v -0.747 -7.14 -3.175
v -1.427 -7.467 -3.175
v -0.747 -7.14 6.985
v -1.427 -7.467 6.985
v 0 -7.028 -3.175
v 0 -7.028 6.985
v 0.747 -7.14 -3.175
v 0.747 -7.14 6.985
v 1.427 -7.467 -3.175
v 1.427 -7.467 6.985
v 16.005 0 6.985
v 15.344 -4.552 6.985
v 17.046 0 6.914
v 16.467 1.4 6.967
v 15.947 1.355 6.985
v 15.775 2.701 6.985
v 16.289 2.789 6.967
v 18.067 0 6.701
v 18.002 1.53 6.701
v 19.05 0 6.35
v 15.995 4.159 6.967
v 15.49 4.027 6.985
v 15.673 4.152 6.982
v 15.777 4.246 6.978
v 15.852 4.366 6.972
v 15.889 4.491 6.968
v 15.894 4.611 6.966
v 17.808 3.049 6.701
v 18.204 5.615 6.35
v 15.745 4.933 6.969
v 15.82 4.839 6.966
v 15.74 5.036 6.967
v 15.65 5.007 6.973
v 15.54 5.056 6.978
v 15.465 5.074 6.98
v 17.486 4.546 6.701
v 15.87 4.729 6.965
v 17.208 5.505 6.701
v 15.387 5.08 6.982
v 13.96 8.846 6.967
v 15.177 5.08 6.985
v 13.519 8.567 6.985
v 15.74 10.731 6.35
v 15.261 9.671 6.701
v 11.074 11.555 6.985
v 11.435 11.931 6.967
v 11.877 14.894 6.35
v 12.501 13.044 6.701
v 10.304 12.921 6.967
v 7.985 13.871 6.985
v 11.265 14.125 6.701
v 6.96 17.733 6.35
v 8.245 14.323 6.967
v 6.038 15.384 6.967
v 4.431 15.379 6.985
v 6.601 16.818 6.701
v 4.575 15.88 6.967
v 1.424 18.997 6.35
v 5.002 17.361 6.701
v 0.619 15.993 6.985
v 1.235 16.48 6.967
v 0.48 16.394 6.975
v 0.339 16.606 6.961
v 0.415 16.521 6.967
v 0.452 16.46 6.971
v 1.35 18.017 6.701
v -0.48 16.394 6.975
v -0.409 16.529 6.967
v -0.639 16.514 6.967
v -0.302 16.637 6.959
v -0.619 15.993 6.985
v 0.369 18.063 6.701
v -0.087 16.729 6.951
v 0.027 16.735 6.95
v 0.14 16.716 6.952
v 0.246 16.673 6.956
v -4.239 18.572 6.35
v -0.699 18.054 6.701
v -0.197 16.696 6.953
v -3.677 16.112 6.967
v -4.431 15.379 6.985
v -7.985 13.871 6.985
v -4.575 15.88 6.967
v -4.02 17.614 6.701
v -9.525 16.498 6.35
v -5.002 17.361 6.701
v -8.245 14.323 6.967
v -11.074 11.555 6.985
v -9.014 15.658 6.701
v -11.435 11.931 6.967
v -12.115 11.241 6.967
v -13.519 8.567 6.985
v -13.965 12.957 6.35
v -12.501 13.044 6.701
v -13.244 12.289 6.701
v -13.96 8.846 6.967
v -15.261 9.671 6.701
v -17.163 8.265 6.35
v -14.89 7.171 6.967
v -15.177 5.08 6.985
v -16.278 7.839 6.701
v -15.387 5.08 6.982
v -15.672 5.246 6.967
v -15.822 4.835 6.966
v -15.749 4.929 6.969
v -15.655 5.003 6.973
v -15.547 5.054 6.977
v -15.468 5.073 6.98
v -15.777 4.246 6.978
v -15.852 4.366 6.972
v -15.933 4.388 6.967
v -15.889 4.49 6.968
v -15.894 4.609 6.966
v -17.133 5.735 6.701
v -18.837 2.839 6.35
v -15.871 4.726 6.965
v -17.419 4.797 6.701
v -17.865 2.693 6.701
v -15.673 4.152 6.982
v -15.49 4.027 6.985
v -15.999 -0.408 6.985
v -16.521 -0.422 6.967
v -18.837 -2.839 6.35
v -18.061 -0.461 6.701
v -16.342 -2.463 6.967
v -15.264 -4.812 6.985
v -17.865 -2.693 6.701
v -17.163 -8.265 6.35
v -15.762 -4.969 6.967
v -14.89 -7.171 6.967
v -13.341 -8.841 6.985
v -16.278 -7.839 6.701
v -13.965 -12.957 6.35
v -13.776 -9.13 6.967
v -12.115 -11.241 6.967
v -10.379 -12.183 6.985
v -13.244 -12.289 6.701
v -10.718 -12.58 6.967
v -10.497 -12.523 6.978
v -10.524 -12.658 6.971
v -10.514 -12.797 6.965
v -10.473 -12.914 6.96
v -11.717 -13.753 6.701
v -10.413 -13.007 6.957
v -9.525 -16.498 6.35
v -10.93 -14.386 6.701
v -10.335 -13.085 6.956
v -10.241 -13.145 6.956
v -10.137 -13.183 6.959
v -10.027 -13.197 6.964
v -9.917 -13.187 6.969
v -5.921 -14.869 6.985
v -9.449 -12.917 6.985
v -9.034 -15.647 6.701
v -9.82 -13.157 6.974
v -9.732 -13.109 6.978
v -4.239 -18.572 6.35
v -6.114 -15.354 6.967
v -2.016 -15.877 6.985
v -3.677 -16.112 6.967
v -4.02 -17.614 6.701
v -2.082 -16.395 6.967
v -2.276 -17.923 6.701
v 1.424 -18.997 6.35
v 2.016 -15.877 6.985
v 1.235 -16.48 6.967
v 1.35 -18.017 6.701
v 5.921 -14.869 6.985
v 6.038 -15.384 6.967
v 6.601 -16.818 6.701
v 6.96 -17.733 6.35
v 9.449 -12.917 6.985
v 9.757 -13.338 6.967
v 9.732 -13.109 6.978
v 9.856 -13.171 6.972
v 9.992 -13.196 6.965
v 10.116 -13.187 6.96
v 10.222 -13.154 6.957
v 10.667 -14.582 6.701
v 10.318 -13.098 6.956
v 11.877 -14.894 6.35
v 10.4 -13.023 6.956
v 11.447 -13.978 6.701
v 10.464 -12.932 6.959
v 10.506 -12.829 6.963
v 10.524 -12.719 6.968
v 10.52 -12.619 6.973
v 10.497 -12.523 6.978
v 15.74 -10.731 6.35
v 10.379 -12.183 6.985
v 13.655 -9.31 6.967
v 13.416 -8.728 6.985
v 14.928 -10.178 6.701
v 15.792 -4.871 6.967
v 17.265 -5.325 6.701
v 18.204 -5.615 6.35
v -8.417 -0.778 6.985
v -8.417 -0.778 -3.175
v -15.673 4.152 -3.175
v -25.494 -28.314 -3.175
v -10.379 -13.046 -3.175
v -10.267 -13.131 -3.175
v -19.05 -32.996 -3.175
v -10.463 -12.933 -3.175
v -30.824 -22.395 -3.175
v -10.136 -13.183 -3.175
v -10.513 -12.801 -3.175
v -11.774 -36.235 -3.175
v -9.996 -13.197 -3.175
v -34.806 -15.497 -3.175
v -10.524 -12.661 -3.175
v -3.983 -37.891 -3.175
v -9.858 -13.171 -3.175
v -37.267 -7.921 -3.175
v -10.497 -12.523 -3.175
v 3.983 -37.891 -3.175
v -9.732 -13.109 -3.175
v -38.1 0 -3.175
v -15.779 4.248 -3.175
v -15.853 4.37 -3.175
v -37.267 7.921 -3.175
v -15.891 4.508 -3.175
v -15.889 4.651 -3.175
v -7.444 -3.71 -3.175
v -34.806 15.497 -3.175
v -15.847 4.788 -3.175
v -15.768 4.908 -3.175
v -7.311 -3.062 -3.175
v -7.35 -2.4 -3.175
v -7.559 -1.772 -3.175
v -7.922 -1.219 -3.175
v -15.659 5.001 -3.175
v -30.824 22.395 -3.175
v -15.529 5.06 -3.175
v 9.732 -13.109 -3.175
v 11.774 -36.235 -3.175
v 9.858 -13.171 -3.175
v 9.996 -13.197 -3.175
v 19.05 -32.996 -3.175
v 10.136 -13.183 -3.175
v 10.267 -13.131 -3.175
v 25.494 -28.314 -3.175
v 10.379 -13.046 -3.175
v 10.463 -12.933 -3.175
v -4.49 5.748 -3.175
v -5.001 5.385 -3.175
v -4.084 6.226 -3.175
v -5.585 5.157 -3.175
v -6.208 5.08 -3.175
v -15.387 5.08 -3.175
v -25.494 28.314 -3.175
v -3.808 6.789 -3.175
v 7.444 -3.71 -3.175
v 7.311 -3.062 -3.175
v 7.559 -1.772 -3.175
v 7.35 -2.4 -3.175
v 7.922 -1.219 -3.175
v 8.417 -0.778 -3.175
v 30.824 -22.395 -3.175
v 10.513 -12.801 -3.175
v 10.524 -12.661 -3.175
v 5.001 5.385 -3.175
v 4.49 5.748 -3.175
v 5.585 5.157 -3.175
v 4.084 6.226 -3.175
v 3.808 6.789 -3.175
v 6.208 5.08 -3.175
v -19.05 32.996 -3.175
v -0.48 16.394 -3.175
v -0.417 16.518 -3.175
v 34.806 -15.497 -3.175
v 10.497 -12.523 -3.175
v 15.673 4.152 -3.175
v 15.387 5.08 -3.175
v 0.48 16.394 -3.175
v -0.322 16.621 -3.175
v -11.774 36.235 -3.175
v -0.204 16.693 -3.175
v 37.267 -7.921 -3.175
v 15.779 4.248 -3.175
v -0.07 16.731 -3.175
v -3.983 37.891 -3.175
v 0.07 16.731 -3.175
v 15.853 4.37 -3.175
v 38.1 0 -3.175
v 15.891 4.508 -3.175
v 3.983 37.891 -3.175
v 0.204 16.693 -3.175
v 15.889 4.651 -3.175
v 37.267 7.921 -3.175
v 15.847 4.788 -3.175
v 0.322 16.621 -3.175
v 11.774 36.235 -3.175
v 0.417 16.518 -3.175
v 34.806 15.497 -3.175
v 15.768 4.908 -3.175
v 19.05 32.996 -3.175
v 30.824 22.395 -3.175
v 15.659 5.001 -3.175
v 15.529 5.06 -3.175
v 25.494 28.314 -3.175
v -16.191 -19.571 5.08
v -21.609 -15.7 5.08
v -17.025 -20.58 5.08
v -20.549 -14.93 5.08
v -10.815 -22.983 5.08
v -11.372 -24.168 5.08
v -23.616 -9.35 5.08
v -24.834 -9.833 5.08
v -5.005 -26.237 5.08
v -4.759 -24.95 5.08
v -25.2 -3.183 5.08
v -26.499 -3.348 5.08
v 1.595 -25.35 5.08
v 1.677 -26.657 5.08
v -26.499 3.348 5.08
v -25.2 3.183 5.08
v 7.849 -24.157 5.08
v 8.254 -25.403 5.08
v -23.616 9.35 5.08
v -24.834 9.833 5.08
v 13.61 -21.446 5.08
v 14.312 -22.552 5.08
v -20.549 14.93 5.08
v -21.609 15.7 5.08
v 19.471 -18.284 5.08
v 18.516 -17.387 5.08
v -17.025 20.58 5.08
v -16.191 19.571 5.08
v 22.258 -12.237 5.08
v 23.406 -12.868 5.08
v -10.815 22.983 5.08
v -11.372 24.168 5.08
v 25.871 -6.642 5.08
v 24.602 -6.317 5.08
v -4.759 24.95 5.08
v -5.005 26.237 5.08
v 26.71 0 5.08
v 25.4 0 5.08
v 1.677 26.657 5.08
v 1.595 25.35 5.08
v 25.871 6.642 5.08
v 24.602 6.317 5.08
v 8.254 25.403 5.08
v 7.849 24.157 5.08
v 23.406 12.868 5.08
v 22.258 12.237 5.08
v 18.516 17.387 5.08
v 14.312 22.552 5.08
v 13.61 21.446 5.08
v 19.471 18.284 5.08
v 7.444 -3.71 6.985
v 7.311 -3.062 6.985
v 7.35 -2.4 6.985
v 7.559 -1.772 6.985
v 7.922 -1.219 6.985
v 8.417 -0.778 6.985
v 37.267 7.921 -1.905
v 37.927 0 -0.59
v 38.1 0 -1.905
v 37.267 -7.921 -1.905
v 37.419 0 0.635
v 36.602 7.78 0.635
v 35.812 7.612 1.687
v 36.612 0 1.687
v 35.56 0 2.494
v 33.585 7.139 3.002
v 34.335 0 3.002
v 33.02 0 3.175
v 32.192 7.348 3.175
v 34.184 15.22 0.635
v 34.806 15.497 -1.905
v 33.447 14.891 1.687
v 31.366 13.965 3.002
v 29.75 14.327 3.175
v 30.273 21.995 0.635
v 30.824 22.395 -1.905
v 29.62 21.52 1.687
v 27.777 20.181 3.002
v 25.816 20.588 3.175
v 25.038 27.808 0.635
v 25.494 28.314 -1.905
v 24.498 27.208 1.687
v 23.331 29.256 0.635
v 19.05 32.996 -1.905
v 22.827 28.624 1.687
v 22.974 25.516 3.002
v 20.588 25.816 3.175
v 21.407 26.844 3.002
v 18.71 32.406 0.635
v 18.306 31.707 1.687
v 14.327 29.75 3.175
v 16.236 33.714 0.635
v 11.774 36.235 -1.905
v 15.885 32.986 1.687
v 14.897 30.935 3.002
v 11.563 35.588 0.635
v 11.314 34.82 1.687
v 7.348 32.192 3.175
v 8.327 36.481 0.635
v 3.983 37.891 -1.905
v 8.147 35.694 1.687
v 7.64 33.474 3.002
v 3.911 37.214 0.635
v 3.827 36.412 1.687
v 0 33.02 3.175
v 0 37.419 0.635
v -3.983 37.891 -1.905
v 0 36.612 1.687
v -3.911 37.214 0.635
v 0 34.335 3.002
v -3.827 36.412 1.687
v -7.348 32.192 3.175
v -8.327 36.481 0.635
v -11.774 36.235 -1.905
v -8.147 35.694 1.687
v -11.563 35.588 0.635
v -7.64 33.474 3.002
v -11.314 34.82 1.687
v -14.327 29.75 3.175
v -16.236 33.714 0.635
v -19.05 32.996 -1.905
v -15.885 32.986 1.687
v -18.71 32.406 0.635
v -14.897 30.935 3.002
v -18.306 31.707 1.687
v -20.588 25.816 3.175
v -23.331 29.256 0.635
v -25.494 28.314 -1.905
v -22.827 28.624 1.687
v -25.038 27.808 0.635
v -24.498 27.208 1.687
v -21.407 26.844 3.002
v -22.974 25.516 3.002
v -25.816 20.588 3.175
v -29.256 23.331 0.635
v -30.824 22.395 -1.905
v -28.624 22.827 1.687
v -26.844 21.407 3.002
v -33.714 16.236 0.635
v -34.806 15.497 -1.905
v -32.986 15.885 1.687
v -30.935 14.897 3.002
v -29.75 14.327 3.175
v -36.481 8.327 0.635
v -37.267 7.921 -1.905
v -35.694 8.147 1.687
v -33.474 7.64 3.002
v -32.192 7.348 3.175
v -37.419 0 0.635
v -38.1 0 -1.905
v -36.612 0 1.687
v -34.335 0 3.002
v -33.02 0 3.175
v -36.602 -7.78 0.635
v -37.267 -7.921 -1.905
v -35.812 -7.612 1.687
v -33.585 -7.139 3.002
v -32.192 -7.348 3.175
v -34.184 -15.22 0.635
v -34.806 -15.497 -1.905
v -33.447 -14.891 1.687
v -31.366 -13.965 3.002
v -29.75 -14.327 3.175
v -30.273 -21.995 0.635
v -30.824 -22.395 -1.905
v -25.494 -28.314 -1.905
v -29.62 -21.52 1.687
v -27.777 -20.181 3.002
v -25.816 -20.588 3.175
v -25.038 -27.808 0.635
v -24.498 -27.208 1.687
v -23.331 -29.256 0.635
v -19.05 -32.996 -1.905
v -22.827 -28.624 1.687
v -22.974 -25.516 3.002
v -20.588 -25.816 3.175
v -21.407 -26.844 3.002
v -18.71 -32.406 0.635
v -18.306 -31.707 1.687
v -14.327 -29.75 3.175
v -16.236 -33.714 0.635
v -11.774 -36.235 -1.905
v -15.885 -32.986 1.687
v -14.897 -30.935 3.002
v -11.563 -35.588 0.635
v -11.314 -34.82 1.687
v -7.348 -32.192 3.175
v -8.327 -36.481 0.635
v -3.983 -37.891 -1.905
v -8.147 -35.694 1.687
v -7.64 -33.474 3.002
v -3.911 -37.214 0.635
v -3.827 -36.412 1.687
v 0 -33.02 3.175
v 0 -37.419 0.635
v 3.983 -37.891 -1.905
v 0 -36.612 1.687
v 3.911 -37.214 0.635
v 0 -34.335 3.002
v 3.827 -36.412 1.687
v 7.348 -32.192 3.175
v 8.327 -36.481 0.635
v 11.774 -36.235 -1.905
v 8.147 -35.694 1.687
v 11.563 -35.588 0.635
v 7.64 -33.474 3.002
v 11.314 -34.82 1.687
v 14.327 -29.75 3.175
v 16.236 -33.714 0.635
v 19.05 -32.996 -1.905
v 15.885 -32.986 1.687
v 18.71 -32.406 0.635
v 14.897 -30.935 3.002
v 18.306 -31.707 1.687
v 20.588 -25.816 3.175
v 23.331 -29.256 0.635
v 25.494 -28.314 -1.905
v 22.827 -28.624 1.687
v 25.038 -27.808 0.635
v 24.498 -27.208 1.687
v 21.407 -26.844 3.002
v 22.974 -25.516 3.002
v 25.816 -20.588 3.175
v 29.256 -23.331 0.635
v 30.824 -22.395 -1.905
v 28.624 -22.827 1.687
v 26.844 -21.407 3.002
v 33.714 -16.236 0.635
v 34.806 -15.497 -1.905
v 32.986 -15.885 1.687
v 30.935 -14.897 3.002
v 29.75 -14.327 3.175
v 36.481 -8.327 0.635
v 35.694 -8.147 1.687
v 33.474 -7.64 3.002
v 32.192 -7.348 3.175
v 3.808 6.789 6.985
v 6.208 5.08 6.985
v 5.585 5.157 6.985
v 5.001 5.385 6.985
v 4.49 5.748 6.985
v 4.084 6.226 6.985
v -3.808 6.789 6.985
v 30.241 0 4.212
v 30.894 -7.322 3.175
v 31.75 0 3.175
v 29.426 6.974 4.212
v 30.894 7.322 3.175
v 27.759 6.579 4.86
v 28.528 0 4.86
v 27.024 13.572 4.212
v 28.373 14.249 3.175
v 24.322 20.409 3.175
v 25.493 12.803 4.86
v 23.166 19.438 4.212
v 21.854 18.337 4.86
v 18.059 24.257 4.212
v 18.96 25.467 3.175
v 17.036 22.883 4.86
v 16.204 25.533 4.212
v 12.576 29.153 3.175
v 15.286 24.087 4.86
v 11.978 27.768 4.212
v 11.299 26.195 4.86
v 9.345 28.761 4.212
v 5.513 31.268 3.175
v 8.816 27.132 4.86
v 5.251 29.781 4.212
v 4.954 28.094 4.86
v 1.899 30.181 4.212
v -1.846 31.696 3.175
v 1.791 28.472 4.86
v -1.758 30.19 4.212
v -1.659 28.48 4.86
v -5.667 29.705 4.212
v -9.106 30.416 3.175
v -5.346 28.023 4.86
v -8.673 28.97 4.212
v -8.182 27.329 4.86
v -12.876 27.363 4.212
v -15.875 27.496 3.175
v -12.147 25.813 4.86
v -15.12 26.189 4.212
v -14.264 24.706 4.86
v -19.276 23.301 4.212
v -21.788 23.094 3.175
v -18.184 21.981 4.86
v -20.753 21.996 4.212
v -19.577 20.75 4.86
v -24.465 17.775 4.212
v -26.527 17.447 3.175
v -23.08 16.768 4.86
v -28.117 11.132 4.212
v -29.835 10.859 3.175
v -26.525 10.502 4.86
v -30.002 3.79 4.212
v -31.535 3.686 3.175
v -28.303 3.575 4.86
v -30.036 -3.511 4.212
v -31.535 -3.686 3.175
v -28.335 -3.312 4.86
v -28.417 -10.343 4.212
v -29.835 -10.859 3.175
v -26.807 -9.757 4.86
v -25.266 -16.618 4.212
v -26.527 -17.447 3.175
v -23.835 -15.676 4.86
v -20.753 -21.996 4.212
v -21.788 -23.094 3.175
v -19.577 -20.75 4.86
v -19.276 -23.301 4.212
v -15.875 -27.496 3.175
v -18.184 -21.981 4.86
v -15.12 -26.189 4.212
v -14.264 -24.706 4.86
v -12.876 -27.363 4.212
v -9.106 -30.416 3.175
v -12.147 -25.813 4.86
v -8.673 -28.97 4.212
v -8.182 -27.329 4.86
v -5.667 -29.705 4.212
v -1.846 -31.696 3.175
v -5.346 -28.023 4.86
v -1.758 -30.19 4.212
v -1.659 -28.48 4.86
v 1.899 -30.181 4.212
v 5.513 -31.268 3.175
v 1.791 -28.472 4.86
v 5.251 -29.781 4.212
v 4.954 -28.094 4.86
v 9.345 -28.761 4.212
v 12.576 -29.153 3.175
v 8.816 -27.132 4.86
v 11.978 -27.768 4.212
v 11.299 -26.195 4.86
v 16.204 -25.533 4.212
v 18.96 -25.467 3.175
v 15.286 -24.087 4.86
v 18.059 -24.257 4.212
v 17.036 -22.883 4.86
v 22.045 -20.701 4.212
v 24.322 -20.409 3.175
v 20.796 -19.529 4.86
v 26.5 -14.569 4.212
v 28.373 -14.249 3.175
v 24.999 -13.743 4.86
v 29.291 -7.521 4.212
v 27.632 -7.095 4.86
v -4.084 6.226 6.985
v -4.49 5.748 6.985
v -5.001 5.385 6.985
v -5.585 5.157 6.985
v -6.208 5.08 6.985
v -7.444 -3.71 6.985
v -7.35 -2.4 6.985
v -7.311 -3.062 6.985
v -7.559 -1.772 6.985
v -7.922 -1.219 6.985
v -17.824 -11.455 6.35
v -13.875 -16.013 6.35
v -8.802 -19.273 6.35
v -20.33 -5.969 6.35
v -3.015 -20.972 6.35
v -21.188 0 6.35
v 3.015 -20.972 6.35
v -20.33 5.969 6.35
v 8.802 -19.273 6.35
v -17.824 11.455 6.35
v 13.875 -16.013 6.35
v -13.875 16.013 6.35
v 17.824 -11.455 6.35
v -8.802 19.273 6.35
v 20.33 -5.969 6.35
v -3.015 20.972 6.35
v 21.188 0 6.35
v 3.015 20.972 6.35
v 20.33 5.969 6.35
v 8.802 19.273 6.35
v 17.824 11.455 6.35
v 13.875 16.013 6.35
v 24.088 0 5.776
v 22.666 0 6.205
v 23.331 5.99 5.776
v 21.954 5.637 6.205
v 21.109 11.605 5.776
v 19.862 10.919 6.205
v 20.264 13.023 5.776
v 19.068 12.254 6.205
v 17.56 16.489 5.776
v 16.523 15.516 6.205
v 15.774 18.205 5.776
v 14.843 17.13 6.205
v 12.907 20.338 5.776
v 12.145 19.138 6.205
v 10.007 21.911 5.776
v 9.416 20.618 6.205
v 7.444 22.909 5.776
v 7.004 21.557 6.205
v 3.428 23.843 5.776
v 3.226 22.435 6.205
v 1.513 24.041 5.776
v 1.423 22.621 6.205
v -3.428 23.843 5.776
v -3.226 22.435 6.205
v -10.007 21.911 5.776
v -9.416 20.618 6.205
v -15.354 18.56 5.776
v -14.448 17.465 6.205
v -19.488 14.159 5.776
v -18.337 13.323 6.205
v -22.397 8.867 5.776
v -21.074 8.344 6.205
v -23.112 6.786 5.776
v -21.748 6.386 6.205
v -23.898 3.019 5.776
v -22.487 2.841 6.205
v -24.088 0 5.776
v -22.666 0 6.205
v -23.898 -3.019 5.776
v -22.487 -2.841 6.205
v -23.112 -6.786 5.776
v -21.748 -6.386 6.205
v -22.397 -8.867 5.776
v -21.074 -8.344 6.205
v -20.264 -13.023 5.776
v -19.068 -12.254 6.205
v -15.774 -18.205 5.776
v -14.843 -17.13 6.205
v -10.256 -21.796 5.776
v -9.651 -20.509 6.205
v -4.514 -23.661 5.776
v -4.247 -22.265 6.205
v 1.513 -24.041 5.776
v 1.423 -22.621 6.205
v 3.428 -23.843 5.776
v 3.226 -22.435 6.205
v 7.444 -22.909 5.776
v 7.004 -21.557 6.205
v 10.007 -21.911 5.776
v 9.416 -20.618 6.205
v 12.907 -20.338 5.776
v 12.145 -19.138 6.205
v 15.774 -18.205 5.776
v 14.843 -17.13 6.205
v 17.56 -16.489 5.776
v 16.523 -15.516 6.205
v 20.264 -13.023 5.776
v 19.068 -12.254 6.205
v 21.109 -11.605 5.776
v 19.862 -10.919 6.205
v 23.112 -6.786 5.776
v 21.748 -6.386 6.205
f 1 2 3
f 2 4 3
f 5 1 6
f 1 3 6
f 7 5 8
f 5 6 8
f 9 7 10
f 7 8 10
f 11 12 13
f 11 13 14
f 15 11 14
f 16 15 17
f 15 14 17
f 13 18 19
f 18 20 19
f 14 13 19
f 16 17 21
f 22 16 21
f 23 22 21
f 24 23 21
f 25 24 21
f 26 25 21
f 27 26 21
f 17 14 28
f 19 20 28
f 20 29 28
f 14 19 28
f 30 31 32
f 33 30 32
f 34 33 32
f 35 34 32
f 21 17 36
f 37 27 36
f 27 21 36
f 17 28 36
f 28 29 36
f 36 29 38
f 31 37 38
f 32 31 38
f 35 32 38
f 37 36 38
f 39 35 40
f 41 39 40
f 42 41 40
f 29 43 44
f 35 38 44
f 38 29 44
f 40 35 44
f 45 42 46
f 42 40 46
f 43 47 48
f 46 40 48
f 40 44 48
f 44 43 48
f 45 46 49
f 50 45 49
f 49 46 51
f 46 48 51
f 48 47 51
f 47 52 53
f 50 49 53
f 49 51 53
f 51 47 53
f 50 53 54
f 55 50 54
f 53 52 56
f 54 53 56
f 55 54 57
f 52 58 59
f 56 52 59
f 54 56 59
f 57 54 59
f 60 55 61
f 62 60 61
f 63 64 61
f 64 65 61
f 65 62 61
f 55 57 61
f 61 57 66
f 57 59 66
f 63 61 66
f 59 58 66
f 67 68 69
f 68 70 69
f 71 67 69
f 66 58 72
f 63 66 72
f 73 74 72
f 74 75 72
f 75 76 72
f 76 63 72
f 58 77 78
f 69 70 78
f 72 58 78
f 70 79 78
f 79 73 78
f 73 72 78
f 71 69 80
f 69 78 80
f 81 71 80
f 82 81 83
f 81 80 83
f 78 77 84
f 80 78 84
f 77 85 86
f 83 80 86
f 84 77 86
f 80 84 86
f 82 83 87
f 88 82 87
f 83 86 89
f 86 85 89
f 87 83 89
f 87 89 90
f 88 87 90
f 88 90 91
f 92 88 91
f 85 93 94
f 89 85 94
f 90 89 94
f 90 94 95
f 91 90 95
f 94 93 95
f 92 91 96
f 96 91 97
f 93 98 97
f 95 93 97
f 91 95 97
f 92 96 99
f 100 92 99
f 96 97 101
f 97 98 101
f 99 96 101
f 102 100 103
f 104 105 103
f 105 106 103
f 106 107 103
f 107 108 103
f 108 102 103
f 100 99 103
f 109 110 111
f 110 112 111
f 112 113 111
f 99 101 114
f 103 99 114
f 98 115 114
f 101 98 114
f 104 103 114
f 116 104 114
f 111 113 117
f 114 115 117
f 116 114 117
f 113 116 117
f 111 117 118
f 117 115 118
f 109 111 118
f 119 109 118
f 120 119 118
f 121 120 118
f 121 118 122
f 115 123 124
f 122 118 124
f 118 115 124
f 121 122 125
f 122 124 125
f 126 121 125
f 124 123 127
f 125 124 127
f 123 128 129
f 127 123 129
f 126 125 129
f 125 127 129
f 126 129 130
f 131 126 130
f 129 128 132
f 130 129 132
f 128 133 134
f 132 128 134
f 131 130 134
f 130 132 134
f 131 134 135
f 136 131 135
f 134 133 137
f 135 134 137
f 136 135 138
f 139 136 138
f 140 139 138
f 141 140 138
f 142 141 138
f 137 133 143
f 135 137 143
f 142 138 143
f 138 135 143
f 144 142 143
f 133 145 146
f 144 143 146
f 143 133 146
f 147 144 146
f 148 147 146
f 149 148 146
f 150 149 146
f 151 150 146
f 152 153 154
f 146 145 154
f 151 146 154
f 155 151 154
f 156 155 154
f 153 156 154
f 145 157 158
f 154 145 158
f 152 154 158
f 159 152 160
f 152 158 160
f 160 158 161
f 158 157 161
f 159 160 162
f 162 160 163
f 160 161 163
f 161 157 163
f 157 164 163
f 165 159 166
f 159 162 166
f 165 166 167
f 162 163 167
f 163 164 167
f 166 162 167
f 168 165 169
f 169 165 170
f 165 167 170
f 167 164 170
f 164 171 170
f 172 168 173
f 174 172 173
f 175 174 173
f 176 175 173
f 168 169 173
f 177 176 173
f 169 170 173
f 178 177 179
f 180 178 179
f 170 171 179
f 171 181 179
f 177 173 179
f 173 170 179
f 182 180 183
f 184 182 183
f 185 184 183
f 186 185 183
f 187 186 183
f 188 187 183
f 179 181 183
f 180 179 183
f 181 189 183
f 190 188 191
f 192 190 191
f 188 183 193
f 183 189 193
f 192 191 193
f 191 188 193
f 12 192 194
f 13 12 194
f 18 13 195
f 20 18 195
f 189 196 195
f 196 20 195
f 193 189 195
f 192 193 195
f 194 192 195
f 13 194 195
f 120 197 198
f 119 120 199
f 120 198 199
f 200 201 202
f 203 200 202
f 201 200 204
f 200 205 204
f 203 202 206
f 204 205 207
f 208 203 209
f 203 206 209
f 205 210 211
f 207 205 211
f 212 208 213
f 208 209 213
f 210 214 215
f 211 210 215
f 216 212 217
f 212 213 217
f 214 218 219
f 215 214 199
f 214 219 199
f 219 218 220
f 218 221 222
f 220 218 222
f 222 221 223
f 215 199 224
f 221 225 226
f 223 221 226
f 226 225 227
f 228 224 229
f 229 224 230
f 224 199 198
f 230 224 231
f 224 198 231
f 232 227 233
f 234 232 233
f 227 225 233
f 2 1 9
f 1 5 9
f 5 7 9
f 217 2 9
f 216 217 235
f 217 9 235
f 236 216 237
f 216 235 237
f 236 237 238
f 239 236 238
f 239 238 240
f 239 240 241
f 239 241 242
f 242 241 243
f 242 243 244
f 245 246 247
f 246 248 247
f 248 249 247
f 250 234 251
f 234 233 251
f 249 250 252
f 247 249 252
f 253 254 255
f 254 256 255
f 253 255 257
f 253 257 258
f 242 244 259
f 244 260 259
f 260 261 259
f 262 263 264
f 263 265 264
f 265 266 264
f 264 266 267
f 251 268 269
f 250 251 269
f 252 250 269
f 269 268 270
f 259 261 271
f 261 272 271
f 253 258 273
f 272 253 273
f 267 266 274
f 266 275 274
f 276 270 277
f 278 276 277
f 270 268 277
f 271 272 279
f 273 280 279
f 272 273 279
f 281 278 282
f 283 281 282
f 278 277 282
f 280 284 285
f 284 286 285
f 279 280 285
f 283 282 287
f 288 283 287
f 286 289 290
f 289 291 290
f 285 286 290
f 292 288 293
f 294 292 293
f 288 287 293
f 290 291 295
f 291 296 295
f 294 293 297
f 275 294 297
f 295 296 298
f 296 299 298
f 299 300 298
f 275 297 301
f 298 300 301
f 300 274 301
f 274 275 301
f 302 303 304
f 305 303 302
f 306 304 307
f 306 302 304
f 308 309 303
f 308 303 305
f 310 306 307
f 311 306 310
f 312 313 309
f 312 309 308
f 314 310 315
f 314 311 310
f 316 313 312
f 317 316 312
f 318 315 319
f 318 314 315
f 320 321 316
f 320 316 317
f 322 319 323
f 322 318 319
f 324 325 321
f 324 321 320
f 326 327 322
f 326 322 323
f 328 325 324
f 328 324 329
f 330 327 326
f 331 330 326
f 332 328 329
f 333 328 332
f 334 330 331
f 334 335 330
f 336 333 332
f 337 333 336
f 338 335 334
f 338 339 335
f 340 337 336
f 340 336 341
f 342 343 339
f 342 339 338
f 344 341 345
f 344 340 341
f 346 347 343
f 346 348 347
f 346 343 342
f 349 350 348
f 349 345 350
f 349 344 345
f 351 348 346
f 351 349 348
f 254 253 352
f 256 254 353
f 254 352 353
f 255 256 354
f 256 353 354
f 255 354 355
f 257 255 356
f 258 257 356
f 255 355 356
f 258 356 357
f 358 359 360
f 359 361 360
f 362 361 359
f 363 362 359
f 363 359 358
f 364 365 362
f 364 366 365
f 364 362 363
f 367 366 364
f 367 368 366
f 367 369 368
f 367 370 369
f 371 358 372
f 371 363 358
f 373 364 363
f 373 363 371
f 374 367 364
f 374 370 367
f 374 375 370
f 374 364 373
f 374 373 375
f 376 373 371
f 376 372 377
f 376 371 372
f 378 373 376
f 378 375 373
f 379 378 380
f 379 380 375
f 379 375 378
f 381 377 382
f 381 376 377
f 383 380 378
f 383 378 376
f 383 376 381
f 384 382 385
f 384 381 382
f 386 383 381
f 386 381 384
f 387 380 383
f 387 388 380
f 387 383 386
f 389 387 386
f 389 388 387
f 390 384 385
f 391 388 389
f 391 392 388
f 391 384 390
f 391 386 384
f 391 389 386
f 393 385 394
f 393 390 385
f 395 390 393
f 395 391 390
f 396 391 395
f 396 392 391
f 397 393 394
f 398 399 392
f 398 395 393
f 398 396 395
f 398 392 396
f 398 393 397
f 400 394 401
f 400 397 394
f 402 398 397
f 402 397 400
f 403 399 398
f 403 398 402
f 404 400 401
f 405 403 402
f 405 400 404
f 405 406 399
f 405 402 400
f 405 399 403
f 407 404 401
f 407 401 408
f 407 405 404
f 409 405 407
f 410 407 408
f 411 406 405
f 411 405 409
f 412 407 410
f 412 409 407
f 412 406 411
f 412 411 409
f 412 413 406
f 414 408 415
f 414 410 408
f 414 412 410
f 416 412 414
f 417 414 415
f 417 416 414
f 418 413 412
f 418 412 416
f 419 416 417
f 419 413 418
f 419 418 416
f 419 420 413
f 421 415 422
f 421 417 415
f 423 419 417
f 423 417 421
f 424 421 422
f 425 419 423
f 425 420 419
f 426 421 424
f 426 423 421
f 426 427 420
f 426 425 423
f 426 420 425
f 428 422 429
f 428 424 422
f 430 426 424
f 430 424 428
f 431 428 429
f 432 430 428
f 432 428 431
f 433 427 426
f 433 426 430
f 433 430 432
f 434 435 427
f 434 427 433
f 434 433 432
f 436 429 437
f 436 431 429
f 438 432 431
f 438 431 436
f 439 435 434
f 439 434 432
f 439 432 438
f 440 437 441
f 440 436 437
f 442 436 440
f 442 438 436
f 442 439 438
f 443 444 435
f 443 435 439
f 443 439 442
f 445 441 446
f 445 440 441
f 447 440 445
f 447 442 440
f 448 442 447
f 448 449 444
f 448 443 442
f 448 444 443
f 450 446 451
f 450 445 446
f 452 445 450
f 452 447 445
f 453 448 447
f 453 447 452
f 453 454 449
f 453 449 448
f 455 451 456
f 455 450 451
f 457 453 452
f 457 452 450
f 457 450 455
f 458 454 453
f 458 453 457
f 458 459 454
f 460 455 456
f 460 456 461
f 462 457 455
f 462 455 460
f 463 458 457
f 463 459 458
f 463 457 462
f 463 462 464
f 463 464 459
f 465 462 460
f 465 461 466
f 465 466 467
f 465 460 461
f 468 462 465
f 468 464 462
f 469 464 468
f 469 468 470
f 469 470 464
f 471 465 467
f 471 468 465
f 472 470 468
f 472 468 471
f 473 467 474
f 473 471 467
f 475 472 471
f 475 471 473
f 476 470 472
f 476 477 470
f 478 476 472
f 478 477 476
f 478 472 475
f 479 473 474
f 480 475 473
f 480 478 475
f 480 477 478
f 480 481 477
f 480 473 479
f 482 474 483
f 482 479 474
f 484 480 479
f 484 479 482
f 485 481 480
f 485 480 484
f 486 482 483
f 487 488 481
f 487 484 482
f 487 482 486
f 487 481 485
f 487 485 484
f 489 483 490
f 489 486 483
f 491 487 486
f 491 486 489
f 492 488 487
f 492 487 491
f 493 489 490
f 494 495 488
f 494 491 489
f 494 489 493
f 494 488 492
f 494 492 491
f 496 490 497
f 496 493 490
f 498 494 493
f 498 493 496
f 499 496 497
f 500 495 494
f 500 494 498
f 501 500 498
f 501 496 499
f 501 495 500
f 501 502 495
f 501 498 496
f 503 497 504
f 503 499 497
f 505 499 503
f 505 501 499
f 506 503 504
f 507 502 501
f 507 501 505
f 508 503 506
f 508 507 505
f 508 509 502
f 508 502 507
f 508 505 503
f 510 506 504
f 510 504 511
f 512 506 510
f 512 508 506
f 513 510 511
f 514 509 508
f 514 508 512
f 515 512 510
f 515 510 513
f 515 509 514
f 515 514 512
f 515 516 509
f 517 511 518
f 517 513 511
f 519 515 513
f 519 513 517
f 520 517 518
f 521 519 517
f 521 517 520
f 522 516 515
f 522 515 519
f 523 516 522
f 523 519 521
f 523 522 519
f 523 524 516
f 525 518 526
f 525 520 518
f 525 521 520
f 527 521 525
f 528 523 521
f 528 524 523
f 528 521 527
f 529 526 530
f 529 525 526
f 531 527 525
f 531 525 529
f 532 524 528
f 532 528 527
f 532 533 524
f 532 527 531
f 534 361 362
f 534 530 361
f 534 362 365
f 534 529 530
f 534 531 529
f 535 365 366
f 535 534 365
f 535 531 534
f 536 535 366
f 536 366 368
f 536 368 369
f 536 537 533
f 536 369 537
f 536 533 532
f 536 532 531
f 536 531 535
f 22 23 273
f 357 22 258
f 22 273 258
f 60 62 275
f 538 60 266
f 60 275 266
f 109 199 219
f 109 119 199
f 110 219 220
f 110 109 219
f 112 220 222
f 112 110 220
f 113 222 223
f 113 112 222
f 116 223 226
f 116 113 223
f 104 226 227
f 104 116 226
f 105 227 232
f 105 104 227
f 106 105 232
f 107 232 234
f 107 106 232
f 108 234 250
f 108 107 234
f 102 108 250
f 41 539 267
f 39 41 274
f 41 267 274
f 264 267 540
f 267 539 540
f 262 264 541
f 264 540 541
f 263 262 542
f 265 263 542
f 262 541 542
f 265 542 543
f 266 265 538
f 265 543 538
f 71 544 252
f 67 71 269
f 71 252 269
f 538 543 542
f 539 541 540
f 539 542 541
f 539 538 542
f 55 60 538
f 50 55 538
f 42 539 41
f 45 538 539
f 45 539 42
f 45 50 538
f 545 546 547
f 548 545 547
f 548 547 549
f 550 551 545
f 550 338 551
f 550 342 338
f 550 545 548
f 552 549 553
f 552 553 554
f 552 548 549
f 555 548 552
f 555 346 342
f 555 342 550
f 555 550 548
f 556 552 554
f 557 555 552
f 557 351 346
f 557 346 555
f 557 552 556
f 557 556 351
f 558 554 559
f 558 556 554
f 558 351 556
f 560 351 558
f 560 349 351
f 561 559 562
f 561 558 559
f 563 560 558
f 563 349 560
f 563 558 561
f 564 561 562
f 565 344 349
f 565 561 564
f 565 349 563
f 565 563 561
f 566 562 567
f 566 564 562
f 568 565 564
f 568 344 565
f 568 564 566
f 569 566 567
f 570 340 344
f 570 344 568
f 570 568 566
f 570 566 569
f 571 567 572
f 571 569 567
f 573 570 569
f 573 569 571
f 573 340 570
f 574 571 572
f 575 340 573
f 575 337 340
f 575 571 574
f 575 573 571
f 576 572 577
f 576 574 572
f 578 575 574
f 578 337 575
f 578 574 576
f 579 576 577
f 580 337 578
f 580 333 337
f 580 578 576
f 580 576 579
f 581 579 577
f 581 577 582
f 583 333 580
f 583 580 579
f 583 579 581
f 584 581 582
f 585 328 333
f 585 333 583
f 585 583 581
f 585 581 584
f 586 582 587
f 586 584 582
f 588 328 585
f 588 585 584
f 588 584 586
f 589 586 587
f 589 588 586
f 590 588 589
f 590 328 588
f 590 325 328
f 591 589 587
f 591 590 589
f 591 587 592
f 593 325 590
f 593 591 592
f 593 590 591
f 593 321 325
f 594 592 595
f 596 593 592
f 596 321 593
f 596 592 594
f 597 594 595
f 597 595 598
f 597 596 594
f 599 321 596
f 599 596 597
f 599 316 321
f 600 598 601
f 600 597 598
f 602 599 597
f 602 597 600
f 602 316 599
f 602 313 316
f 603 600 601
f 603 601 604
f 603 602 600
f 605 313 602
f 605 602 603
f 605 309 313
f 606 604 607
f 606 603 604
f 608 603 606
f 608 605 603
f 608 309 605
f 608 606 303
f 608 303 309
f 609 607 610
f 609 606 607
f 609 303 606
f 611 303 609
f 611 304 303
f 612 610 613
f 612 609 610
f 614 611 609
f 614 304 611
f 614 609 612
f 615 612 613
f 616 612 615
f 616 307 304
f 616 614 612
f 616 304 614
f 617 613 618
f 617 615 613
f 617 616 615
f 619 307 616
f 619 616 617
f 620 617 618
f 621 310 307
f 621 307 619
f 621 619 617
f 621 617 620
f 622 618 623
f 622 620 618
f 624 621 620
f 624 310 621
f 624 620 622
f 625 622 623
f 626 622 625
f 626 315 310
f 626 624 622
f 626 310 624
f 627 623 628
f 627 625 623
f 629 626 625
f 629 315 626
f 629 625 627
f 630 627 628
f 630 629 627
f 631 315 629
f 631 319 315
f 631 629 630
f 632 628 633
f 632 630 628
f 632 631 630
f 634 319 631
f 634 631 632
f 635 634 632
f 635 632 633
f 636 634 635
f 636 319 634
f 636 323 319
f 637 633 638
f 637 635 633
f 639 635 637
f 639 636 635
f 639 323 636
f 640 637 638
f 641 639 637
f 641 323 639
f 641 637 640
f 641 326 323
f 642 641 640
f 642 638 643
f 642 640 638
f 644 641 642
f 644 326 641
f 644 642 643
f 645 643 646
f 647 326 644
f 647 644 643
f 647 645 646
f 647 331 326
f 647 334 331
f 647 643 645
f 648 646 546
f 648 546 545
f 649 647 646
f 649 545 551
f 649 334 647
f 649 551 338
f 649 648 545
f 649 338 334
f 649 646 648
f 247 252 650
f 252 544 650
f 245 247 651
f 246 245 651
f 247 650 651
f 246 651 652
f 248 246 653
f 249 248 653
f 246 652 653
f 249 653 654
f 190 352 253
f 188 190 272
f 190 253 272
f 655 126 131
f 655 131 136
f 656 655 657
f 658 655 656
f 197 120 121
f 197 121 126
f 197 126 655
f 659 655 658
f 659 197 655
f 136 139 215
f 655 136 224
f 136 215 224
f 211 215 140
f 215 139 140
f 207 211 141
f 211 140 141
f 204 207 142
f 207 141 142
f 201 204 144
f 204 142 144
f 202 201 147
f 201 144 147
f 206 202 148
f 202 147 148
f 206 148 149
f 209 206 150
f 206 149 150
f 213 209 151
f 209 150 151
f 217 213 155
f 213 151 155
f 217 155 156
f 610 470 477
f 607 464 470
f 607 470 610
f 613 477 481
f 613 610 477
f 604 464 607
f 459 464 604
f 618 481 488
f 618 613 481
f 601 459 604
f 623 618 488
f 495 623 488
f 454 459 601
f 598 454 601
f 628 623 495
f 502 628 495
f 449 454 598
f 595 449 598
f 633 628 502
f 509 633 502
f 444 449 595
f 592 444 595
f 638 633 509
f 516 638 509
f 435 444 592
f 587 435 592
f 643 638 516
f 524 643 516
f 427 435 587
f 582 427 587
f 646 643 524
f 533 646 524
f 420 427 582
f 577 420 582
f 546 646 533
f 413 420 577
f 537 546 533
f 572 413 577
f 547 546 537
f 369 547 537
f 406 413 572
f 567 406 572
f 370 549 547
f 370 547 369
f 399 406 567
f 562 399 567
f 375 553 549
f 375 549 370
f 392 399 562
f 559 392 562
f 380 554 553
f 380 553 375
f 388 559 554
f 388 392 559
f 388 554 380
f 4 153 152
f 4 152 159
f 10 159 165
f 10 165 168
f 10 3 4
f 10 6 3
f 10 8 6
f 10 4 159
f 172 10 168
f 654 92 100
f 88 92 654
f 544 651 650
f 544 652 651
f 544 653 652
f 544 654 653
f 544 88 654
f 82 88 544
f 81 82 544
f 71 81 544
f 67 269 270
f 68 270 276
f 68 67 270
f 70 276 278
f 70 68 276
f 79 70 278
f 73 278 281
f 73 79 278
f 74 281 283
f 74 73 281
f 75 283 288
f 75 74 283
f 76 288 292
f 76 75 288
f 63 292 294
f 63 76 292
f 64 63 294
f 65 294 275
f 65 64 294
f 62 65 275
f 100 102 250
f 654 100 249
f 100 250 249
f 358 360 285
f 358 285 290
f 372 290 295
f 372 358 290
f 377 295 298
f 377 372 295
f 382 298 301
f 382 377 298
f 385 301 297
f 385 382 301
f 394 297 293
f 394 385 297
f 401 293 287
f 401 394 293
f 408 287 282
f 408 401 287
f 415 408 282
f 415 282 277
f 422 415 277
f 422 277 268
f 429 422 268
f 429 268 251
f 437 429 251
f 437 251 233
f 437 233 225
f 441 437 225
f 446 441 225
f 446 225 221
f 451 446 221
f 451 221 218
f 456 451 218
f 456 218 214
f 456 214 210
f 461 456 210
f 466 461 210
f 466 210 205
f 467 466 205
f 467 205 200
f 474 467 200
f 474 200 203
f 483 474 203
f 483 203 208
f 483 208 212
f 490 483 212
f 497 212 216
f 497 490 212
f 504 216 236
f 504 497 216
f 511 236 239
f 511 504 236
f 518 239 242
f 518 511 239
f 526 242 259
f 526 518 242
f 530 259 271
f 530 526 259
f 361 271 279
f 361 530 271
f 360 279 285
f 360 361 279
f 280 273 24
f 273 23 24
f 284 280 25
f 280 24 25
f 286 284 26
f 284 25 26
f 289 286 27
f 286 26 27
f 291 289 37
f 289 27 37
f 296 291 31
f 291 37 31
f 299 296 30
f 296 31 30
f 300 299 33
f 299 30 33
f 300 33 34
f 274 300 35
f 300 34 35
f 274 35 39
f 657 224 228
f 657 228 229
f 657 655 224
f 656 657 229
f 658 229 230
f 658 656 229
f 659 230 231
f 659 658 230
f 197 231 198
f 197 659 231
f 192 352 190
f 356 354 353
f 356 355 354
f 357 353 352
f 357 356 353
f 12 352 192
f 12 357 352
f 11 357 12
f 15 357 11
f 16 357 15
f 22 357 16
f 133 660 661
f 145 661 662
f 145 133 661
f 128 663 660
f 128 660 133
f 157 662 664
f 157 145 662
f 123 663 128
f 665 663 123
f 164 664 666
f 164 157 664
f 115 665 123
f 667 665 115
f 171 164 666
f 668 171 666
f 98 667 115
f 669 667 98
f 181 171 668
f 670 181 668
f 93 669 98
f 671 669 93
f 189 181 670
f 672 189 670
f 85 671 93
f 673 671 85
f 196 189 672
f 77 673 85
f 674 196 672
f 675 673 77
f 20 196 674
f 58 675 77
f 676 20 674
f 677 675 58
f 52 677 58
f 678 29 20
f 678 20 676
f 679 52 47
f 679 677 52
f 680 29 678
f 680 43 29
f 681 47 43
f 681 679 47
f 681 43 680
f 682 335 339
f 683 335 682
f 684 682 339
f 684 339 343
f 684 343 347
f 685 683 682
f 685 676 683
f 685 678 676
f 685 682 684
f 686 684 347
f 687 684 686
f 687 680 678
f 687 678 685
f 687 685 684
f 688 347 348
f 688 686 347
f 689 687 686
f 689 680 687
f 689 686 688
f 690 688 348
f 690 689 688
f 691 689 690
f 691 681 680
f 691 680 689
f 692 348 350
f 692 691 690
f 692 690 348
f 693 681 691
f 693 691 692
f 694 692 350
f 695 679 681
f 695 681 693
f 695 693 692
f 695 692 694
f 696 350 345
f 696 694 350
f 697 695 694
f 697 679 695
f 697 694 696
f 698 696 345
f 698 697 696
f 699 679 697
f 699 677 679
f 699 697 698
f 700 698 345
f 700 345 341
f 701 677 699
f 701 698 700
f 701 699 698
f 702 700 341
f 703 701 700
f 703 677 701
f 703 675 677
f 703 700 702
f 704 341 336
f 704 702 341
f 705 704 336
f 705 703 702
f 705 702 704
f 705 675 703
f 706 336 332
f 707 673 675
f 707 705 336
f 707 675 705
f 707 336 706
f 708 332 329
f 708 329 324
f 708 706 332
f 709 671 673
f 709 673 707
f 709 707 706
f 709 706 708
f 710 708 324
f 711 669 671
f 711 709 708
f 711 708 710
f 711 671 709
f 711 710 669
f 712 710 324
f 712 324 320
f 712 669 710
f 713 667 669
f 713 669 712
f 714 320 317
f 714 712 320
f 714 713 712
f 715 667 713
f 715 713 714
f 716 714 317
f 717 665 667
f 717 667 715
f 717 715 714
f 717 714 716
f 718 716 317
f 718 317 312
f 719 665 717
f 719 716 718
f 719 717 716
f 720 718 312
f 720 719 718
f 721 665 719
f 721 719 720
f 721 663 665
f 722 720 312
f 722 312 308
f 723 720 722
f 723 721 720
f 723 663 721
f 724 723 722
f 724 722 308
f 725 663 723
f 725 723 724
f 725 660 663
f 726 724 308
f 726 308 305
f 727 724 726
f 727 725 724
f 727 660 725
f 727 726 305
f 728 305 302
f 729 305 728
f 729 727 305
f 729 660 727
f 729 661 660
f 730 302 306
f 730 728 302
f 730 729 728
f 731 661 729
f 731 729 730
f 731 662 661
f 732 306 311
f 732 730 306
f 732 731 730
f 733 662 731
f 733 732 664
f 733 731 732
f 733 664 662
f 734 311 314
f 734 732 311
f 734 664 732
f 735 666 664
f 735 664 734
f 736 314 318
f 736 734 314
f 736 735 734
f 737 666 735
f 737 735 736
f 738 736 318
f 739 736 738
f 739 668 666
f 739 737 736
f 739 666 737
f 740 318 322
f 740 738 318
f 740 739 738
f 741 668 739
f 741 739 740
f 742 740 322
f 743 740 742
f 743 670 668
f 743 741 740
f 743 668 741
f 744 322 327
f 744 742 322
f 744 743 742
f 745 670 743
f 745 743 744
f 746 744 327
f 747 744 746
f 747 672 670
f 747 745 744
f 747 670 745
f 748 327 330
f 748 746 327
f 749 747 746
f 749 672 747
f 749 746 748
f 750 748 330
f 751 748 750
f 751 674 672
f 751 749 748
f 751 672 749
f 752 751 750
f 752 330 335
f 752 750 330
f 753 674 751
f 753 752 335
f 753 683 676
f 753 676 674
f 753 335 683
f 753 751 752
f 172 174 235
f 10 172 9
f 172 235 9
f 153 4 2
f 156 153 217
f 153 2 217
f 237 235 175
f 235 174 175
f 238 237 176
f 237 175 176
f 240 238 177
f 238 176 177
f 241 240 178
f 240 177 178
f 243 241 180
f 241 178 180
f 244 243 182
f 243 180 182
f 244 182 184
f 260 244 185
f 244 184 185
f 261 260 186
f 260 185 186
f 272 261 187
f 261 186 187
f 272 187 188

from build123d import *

# Parameters (mm, degrees)
F0_R      = 38.1
F1_DEPTH  = 3.175
F3_R      = 31.75
F4_DEPTH  = 1.905
F5_R      = 25.4
F6_DEPTH  = 1.27
F7_R      = 19.05
F8_DEPTH  = 0.635
F10_DEPTH = 10.161
F11_R     = 5.08
F15_R     = 2.54
F16_R     = 0.508


# Not quite as in the source:
# - a fillet or chamfer that OpenCascade refuses, or shapes differently, is made with other operations: its cross-section is extruded or revolved along the edge and cut away or added


with BuildPart() as f1:
    # F0 (on Top) → F1 (new body, symmetric)
    with BuildSketch(Plane.XY):
        Circle(F0_R)
    extrude(amount=F1_DEPTH, both=True)

    # F3 (on face) → F4 (join)
    with BuildSketch(Plane.XY.offset(3.175)):
        Circle(F3_R)
    extrude(amount=F4_DEPTH)

    # F5 (on face) → F6 (join)
    with BuildSketch(Plane.XY.offset(5.08)):
        Circle(F5_R)
    extrude(amount=F6_DEPTH)

    # F7 (on face) → F8 (join)
    with BuildSketch(Plane.XY.offset(6.35)):
        Circle(F7_R)
    extrude(amount=F8_DEPTH)

    # F9 (on face) → F10 (cut, through all)
    with BuildSketch(Plane(origin=(0, 0, -3.175), x_dir=(1, 0, 0), z_dir=(0, 0, -1))):
        Polygon((-6.8075360054, 1.8716637263), (-17.0388379885, -5.08), (-4.3994090512, -5.08), (0, -17.78), (4.3994090512, -5.08), (17.0388379885, -5.08), (6.8075360054, 1.8716637263), (10.9985226281, 13.97), (0, 6.4970477871), (-10.9985226281, 13.97), align=None)
    extrude(amount=-F10_DEPTH, mode=Mode.SUBTRACT)

    # F11
    f11_edges = [f1.edges().sort_by_distance(p)[0] for p in [
        (-38.1, 0, 3.175),
    ]]
    fillet(f11_edges, radius=F11_R)

    # F12: fillet of radius 7.62 on 1 edges, made by hand

    # F12_s1 → F12_t2 (revolve, cut)
    with BuildSketch(Plane.XZ):
        with BuildLine():
            ThreePointArc((31.75, 3.175), (29.4039205887, 4.5878573218), (26.7098437524, 5.08))
            Line((26.7098437524, 5.08), (31.75, 5.08))
            Line((31.75, 5.08), (31.75, 3.175))
        make_face()
    revolve(axis=Axis((0, 0, 5.08), (0, 0, 1)), mode=Mode.SUBTRACT)

    # F13: fillet of radius 7.62 on 1 edges, made by hand

    # F13_s1 → F13_t2 (revolve, cut)
    with BuildSketch(Plane.XZ):
        with BuildLine():
            ThreePointArc((25.4, 5.08), (23.3875910419, 6.0255945611), (21.1878865162, 6.35))
            Line((21.1878865162, 6.35), (25.4, 6.35))
            Line((25.4, 6.35), (25.4, 5.08))
        make_face()
    revolve(axis=Axis((0, 0, 6.35), (0, 0, 1)), mode=Mode.SUBTRACT)

    # F14: fillet of radius 7.62 on 1 edges, made by hand

    # F14_s1 → F14_t2 (revolve, cut)
    with BuildSketch(Plane.XZ):
        with BuildLine():
            ThreePointArc((16.0046469827, 6.985), (17.5600729694, 6.824560979), (19.05, 6.35))
            Line((19.05, 6.35), (19.05, 6.985))
            Line((19.05, 6.985), (16.0046469827, 6.985))
        make_face()
    revolve(axis=Axis((0, 0, 6.985), (0, 0, 1)), mode=Mode.SUBTRACT)

    # F15
    f15_edges = [f1.edges().sort_by_distance(p)[0] for p in [
        (4.399409, 5.08, 1.905),
        (-4.399409, 5.08, 1.905),
        (-6.807536, -1.871664, 1.905),
        (0, -6.497048, 1.905),
        (6.807536, -1.871664, 1.905),
    ]]
    fillet(f15_edges, radius=F15_R)

    # F16
    f16_edges = [f1.edges().sort_by_distance(p)[0] for p in [
        (-10.998523, -13.97, 1.800149),
        (-17.038838, 5.08, 1.800149),
        (0, 17.78, 1.800149),
        (17.038838, 5.08, 1.800149),
        (10.998523, -13.97, 1.800149),
    ]]
    fillet(f16_edges, radius=F16_R)


solid = f1.part
